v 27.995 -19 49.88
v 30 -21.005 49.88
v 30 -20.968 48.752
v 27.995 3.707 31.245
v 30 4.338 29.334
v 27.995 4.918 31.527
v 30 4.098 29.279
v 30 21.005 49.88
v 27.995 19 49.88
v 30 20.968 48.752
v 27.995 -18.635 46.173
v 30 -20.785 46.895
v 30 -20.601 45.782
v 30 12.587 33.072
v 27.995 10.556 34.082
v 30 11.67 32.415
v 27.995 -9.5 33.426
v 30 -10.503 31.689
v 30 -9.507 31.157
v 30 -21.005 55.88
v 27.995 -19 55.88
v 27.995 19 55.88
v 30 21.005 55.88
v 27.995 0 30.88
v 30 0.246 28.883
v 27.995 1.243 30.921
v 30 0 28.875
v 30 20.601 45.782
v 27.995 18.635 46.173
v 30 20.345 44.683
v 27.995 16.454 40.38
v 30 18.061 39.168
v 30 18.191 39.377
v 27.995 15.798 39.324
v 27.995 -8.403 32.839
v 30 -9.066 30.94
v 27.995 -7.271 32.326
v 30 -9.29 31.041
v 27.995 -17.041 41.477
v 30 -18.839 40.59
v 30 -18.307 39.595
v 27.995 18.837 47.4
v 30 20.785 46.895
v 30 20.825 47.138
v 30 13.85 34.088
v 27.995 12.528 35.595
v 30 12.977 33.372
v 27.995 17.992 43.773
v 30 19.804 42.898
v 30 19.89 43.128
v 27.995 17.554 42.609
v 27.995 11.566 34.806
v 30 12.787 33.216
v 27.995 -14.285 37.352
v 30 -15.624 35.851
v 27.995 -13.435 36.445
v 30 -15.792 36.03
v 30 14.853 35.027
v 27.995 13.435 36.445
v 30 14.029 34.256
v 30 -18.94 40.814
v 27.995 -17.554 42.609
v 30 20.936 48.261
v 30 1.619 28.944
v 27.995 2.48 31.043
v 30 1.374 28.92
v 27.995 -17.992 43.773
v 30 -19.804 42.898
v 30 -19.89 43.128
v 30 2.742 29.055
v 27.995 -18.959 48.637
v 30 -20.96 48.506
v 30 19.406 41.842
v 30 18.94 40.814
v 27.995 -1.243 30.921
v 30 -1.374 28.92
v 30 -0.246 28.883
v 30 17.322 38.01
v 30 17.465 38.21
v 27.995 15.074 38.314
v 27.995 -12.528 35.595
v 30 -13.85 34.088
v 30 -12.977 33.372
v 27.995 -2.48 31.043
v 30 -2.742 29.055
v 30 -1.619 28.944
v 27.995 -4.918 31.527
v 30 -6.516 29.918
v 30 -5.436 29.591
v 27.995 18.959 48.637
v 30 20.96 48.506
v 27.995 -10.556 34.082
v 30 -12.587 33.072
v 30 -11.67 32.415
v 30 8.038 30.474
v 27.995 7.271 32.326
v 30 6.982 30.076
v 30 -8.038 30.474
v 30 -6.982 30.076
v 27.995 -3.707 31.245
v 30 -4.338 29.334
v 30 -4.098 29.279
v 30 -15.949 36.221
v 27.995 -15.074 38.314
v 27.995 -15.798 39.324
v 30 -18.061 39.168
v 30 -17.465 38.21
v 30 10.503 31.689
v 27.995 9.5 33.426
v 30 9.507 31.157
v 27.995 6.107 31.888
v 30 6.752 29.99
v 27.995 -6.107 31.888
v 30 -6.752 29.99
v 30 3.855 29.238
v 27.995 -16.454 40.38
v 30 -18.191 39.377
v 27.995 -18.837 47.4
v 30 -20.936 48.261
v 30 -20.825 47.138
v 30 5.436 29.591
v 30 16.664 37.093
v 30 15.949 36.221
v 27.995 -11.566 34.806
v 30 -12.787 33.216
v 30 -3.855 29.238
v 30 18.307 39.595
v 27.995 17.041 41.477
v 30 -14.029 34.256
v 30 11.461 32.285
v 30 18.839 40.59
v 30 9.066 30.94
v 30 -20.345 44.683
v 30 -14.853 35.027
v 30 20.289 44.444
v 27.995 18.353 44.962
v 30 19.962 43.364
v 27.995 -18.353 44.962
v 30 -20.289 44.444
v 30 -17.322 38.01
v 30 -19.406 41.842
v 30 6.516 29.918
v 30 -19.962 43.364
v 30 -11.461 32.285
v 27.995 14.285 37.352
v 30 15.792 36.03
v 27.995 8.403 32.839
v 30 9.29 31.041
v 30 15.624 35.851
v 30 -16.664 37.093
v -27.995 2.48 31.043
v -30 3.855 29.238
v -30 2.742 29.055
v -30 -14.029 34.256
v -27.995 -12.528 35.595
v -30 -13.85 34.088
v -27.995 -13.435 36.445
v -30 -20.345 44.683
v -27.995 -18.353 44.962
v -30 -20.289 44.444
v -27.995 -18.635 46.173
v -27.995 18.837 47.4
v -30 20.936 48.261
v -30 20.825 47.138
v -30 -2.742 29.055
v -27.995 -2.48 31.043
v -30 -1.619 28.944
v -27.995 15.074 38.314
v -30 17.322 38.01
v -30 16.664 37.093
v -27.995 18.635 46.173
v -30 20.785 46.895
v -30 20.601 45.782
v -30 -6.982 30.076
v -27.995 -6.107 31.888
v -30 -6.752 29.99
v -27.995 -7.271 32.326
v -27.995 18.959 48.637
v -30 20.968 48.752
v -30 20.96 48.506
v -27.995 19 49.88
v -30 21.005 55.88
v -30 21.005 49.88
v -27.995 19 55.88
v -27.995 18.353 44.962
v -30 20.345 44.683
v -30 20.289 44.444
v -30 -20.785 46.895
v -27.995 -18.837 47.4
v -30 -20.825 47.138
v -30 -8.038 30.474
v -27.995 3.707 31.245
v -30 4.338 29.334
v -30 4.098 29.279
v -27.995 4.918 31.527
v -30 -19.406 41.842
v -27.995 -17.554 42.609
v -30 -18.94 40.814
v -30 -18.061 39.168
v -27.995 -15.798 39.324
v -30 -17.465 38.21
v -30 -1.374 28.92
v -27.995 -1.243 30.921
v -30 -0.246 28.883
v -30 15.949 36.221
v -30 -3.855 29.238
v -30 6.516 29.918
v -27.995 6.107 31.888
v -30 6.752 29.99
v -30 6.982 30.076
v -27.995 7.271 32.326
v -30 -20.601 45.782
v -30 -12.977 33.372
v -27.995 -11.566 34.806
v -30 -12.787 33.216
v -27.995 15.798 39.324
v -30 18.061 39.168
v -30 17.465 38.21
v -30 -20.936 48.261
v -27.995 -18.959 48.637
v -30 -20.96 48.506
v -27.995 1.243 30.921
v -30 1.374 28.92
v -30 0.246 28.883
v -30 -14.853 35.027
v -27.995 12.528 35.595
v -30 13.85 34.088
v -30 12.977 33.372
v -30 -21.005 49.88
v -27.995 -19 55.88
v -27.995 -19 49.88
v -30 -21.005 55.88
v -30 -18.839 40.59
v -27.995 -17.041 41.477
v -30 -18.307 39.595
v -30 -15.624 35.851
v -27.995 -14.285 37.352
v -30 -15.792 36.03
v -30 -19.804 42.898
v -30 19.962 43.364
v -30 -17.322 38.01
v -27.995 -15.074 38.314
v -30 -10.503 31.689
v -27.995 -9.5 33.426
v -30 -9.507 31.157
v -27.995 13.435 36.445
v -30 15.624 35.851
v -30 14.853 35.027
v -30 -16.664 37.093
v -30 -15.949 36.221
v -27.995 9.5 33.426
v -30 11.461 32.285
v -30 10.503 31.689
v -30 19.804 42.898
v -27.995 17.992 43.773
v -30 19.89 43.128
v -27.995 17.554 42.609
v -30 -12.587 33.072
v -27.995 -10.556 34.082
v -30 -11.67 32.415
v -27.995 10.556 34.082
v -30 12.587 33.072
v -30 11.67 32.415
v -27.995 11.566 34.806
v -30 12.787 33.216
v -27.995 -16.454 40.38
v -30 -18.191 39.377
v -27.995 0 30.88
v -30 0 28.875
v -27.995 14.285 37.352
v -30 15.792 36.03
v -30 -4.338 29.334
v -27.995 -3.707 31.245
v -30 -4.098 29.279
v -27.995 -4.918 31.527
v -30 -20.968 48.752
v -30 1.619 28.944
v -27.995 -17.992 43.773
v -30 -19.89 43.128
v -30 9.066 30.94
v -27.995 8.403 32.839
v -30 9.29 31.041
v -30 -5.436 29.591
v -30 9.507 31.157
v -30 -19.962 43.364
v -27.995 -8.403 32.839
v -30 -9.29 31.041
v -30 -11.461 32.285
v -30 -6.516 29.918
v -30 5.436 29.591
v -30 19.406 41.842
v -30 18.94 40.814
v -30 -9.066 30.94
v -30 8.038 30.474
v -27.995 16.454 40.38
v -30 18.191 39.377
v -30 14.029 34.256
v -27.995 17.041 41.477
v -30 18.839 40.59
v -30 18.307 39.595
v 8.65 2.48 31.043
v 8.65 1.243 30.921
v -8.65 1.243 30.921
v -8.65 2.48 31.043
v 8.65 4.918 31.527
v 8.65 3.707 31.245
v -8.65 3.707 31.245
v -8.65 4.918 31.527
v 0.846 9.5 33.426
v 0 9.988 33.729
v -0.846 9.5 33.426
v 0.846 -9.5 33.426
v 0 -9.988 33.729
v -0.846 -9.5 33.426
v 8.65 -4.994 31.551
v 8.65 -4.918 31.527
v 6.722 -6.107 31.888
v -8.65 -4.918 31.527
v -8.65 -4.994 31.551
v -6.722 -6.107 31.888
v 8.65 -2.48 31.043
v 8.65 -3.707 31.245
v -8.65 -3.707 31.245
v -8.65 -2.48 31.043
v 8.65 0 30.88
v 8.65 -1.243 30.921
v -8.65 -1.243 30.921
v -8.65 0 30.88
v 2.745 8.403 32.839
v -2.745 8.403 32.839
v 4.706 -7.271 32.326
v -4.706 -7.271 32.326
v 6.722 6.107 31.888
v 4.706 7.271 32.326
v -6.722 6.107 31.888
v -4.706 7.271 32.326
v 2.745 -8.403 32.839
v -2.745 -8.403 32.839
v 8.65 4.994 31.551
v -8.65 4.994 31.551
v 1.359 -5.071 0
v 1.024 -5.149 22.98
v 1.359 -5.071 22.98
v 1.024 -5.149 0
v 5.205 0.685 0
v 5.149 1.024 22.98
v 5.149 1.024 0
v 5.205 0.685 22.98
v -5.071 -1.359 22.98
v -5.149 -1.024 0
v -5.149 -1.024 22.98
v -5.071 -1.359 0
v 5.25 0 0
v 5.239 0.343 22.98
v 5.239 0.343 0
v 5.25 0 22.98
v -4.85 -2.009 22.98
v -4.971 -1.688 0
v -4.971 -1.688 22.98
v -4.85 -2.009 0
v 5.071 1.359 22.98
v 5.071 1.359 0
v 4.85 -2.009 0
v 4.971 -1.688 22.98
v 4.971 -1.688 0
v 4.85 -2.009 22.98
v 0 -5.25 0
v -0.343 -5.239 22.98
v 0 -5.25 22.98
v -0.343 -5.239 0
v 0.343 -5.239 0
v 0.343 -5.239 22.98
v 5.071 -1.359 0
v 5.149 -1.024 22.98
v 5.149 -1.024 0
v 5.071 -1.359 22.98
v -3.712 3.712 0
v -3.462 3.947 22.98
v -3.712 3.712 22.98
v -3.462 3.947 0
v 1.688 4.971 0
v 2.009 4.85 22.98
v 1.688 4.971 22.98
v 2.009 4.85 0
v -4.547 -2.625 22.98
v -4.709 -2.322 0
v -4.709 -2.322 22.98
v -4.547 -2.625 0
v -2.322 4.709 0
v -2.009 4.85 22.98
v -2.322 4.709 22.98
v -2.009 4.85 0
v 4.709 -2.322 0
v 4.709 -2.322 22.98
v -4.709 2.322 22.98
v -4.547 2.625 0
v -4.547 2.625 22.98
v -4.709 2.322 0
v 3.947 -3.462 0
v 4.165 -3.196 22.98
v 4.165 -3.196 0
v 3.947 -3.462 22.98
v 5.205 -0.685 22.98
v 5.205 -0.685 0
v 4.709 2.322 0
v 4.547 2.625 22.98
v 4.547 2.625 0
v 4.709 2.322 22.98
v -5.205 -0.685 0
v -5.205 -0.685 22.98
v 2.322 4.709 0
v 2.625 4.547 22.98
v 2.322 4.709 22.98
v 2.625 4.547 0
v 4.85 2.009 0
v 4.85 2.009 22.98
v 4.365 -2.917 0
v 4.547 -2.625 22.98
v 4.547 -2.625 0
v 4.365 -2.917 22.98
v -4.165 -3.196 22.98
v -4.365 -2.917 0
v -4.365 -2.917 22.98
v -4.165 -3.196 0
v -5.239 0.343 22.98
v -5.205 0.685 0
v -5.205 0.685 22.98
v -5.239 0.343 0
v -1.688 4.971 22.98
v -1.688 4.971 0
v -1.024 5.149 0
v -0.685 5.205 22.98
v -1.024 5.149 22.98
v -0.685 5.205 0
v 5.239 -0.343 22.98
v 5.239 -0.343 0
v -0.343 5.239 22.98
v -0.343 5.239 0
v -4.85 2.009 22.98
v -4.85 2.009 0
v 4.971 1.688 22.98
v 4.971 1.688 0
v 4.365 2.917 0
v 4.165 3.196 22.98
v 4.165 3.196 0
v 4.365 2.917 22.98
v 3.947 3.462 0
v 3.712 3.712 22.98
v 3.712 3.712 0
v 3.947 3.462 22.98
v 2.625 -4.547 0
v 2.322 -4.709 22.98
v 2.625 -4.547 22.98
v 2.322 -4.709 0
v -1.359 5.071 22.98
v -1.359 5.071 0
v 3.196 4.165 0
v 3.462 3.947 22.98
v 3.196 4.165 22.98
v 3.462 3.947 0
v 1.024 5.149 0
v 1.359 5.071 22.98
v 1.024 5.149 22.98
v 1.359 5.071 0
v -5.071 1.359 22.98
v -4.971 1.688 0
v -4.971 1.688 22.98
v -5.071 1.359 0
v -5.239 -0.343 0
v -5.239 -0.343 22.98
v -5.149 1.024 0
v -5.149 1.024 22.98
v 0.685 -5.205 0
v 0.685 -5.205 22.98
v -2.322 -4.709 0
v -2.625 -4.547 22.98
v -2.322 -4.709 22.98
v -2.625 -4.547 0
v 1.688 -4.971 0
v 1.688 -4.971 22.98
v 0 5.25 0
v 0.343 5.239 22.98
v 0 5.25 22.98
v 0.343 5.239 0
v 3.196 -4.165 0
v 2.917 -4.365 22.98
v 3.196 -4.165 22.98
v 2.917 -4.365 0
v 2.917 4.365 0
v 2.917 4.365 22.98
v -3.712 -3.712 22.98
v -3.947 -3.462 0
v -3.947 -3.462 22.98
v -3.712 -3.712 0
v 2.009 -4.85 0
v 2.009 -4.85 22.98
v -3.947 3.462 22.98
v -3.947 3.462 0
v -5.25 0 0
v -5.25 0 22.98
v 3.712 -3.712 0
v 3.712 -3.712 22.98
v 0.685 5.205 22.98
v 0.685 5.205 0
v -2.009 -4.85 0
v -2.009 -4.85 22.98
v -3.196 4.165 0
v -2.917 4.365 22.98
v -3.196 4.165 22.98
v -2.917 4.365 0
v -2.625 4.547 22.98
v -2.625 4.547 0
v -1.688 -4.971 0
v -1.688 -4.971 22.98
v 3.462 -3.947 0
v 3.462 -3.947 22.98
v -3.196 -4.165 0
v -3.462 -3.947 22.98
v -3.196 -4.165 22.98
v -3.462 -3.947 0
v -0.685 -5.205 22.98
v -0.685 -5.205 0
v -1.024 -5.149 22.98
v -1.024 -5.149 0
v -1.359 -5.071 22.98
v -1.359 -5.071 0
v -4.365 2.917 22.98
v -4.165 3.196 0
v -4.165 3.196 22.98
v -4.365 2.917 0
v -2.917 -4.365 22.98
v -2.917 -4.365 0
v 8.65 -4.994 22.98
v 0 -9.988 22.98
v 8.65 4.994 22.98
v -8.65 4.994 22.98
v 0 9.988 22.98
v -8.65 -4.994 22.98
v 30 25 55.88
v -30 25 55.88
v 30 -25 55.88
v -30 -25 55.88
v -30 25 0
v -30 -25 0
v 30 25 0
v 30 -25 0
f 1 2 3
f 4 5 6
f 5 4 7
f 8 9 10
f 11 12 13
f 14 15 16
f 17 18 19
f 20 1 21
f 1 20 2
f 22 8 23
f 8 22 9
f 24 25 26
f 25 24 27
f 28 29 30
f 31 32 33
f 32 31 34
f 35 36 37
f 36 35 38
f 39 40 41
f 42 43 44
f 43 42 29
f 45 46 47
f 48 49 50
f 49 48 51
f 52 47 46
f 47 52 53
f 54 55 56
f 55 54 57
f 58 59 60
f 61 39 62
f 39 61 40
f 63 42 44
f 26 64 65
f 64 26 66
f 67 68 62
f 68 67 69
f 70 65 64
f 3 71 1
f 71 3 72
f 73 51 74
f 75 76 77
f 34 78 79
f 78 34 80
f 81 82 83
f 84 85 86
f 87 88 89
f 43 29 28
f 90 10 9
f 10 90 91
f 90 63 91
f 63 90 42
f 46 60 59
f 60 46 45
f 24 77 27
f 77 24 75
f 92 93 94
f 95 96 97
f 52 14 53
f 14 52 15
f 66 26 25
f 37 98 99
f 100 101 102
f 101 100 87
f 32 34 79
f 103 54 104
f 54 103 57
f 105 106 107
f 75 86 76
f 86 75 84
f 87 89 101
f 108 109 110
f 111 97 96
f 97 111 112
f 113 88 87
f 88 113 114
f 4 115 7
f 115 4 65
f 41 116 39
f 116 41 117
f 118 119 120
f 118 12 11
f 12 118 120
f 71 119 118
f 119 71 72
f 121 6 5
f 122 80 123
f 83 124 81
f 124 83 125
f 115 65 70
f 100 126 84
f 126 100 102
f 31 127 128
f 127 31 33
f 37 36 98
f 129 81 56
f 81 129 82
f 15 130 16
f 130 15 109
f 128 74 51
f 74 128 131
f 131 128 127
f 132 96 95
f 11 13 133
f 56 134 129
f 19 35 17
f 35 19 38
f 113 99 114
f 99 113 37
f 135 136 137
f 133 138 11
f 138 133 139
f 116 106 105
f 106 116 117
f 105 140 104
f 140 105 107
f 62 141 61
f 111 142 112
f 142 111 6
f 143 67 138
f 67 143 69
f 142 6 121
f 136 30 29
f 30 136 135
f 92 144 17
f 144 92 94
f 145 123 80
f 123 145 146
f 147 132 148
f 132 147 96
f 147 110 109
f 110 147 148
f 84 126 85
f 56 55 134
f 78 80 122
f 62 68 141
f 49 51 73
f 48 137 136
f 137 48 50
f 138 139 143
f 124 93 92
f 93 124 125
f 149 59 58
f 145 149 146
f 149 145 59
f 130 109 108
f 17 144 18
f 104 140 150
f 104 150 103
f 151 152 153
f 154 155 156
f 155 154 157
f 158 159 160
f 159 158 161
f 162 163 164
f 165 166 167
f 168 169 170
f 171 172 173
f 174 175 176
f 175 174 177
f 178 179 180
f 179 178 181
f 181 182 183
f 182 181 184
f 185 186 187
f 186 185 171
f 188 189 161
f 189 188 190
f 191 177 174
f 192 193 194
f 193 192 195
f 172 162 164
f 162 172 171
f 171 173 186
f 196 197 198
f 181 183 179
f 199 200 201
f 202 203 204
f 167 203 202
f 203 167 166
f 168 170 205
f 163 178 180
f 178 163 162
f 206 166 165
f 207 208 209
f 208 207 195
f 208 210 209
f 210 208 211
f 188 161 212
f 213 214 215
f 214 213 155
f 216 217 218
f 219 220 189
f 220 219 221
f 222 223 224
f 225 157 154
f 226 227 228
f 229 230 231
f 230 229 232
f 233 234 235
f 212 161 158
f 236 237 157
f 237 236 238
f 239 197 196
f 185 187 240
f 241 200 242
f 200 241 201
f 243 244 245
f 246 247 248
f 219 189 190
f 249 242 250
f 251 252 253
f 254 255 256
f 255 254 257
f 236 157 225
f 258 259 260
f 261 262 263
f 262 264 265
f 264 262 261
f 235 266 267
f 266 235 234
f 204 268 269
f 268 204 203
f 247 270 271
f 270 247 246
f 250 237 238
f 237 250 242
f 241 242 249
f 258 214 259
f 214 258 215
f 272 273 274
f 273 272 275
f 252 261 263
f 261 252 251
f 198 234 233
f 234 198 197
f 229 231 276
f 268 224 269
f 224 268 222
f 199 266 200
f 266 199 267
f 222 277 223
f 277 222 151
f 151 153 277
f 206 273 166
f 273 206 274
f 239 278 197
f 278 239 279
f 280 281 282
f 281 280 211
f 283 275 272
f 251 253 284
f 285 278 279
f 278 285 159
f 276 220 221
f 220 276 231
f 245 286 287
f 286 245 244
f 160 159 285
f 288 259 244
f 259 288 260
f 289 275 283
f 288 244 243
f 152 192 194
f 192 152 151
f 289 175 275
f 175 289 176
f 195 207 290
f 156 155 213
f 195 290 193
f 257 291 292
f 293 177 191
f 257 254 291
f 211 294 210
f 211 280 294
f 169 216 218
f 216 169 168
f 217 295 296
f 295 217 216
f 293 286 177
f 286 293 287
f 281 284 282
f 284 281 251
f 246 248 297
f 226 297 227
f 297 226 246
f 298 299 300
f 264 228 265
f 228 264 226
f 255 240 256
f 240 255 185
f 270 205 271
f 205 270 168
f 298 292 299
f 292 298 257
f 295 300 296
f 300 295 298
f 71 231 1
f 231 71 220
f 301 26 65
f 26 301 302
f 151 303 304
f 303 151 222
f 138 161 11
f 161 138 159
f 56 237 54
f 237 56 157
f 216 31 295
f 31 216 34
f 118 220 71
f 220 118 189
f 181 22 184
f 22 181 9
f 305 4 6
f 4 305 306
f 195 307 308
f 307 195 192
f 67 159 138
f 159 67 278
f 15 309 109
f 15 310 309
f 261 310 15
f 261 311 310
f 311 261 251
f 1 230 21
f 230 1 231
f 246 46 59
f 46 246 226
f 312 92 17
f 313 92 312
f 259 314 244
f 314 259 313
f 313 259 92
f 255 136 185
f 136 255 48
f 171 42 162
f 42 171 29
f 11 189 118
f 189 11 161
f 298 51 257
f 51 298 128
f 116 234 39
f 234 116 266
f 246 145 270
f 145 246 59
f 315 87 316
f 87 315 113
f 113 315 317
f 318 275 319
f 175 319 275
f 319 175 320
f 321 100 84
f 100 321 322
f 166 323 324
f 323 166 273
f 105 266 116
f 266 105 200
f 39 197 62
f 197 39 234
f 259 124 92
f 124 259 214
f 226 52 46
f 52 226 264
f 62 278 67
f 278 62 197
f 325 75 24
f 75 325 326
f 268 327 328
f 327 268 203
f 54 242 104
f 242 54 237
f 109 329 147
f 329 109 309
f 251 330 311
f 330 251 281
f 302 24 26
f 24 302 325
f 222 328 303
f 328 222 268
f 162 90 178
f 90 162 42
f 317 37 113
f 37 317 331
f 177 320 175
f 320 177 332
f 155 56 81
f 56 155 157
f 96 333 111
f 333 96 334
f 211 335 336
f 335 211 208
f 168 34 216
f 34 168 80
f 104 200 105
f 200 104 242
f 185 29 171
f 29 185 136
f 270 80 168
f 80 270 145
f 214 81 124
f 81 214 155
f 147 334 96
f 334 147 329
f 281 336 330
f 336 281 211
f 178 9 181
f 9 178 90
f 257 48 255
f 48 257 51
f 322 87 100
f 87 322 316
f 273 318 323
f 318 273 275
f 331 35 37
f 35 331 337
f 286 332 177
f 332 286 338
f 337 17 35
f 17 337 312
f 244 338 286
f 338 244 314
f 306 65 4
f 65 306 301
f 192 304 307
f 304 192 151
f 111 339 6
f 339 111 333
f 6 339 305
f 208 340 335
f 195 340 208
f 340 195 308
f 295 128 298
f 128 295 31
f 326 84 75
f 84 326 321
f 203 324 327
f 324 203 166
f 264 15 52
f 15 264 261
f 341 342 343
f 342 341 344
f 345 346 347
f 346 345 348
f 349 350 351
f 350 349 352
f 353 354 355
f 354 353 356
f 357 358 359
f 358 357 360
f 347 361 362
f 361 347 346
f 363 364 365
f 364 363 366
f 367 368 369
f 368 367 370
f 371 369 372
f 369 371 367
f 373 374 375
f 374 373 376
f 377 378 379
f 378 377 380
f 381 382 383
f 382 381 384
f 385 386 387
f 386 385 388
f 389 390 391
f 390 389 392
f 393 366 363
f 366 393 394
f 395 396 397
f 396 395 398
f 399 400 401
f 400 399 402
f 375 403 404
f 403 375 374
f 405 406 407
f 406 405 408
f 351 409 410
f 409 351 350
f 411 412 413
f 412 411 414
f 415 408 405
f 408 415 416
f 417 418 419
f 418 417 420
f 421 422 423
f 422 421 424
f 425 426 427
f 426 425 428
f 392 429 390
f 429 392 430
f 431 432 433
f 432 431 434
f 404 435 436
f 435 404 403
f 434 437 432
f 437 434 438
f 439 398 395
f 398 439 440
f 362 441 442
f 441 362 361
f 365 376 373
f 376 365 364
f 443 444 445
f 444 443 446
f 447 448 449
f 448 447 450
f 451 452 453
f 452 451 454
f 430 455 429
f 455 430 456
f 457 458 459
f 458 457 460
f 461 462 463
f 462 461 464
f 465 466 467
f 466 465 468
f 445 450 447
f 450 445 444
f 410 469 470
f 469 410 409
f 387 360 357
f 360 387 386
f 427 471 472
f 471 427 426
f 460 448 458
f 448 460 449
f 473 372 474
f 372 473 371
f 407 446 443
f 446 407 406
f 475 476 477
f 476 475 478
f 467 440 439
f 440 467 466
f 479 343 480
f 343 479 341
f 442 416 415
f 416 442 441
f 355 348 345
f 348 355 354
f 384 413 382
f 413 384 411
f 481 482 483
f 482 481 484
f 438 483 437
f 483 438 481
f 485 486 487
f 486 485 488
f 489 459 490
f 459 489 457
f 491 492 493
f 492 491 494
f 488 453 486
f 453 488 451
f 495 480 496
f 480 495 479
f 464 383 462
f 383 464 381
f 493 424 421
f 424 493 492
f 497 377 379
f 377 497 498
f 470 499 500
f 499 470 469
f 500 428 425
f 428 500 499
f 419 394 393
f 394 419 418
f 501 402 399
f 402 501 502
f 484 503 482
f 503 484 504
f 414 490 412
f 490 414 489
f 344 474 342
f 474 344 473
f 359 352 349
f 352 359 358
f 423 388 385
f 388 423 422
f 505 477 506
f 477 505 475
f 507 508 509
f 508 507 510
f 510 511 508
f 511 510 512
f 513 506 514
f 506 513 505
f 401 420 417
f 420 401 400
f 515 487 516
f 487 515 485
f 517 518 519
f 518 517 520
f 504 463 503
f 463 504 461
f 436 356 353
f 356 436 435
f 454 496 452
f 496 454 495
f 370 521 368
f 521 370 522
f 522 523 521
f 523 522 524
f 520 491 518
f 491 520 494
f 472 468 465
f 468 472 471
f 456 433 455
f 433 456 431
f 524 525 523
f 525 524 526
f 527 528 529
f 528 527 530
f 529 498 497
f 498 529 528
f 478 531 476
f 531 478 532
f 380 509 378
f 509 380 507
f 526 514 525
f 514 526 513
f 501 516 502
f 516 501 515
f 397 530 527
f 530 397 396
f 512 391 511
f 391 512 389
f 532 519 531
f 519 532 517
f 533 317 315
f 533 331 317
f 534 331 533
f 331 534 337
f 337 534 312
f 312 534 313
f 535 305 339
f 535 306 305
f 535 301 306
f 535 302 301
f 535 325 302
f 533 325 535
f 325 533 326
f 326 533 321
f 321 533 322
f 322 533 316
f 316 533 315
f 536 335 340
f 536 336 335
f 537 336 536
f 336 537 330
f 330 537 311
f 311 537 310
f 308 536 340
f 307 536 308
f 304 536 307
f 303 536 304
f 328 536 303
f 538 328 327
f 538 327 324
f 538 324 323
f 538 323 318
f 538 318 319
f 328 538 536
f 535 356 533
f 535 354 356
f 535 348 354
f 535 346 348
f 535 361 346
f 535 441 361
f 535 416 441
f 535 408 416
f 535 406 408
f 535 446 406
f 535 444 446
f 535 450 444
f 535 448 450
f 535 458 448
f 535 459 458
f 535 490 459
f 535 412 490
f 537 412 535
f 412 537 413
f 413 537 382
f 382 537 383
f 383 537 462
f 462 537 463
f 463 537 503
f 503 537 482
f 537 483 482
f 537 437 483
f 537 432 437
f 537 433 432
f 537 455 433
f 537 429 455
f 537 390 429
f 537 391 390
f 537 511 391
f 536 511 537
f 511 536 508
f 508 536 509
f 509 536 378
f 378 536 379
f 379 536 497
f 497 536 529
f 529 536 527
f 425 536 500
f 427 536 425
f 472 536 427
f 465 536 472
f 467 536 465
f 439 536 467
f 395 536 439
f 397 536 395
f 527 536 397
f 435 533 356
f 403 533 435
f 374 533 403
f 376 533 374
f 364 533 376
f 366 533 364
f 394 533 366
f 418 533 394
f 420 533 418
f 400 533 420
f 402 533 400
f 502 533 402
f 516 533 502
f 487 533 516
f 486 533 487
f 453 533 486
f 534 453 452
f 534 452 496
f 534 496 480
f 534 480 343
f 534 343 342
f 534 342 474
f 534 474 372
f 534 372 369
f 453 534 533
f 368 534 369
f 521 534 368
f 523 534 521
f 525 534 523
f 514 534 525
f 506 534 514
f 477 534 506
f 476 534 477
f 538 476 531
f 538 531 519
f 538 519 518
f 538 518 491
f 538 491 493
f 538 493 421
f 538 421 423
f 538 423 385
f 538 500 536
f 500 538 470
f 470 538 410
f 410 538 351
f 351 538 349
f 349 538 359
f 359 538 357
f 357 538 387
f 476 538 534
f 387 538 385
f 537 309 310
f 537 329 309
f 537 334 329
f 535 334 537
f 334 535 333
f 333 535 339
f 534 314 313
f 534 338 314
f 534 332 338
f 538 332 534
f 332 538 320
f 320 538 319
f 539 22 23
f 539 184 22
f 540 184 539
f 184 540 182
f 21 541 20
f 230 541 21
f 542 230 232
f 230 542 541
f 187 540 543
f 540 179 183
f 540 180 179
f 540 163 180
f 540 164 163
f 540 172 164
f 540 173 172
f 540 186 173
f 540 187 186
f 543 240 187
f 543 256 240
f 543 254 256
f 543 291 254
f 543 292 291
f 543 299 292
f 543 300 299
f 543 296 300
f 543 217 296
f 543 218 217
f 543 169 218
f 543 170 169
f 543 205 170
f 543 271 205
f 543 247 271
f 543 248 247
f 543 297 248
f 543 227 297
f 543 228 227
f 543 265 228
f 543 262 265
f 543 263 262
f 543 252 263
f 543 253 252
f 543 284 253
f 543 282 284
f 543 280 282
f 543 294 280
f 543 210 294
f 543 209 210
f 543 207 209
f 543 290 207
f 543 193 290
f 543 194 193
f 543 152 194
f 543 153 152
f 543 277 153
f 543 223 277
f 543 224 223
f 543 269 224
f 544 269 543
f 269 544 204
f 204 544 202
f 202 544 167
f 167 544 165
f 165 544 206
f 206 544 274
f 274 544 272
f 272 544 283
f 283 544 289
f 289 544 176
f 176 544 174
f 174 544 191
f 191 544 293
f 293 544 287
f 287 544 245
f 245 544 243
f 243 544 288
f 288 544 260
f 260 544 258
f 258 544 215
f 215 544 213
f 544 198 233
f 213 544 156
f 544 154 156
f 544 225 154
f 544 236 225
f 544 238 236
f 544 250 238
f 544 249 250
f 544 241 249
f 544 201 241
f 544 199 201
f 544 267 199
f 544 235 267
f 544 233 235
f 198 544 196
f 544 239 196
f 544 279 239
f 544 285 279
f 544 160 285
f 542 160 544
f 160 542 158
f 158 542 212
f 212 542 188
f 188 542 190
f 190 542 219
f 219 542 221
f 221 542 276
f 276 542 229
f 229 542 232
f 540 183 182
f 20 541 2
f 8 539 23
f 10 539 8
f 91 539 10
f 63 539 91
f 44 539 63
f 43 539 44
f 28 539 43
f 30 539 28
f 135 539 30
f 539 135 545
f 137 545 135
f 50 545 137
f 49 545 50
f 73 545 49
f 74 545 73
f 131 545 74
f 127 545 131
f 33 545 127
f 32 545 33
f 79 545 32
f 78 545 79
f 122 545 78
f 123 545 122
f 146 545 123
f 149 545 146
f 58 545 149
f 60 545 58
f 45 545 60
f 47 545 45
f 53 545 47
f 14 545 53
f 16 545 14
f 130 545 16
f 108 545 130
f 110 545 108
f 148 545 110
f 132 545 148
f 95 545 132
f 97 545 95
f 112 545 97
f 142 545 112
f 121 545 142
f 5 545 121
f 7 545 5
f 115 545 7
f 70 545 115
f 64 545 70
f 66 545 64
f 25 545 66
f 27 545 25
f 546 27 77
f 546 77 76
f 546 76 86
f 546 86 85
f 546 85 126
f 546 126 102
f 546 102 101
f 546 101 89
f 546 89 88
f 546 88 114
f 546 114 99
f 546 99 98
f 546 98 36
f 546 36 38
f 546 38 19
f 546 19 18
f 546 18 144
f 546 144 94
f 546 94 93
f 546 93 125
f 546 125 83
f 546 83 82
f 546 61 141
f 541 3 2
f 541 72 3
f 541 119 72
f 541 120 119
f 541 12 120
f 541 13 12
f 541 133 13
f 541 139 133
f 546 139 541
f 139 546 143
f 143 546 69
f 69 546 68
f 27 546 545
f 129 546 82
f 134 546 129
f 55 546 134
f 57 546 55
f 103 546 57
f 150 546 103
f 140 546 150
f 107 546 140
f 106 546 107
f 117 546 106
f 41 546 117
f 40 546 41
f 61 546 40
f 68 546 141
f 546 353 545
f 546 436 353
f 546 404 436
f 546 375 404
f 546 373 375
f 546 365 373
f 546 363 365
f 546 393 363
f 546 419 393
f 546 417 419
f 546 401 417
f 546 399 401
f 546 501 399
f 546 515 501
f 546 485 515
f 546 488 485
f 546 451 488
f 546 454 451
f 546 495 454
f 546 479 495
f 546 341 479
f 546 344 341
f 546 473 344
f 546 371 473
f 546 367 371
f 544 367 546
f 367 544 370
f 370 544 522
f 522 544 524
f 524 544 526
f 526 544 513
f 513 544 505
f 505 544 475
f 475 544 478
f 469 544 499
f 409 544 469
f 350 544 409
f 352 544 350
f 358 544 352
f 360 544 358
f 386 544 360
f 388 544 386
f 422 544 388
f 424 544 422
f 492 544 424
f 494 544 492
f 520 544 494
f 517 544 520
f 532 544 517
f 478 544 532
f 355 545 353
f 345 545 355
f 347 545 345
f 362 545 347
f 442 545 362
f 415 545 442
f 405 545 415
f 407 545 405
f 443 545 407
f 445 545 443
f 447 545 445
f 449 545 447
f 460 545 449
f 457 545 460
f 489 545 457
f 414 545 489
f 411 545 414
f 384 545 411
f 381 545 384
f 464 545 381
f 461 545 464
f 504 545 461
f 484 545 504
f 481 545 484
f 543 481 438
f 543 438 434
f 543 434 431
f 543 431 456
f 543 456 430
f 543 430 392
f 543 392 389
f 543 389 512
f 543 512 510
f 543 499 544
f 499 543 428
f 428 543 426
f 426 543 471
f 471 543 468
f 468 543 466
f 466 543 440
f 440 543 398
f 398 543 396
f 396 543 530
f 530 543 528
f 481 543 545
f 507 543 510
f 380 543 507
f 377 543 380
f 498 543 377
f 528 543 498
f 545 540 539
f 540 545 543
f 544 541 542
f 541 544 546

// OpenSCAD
// freETarget (Competition build) pipe-guide bracket
// A hex pocket traps the M10 bolt head (NUT_TRAP = false) or an M10 nut (NUT_TRAP = true),
// so the fastener is tightened from inside the target box.
// Build all four STLs with ../build-stls.sh.
// Rides the 1" steel pipe uprights so the target can't twist while raising/lowering.
// Source dims: freETarget drawings FRE-007 / FRE-008 (side panels):
//   housing outside width 304 mm, 2x dia 10 mm side holes, 250 mm apart.
//
// Model axes: X = out from the side panel (X=0 is the panel face, printed on the bed)
//             Y = front/back,  Z = vertical, Z=0 at the side-hole centre.
// Set ONE_PIECE = true for a single bracket spanning both holes (needs a >=310 mm bed).

ONE_PIECE   = false;
NUT_TRAP    = false;        // true: trap an M10 nut (bolt head inside the box, use M10x40)
                            // false: trap the hex bolt HEAD (nut inside the box, use M10x55)

IN          = 25.4;
TARGET_W    = 304;          // outside width across side panels
PIPE_GAP_W  = 14.4 * IN;    // design inside-to-inside pipe spacing (measured ~14.5")
PIPE_OD     = 33.4;         // 1" NPS steel pipe = 1.315"
HOLE_PITCH  = 250;          // side-hole spacing

U_CLEAR     = 2.3;          // radial clearance, pipe to U
ARM_T       = 6;            // U arm wall thickness
ARM_PAST    = 6;            // how far the arms extend past the U centre
LEN         = 60;           // height of each bracket head
LEAD        = 2;            // 45-degree lead-in on the U at top and bottom
BOLT_D      = 10.5;         // M10 clearance
HEX_AF      = 17.3;         // hex pocket across flats: traps a 17 mm (DIN 933) or 16 mm (ISO 4017) M10 head
HEAD_H      = NUT_TRAP ? 8 : 6.4;       // M10 nut height / M10 hex head height
HEAD_RECESS = NUT_TRAP ? 4 : 1.5;       // nut/head top sits this far below the U floor
WEB_T       = 10;           // one-piece only: web thickness

FLOOR_X   = (PIPE_GAP_W - TARGET_W) / 2;   // 30.88
U_R       = PIPE_OD/2 + U_CLEAR;           // 19.0
U_CX      = FLOOR_X + U_R;
HALF_W    = U_R + ARM_T;
X_MAX     = U_CX + ARM_PAST;
CB_BOTTOM = FLOOR_X - HEAD_RECESS - HEAD_H;

$fn = 96;

module u_cavity_2d(r) {            // in the XY plane
    translate([U_CX, 0]) circle(r);
    translate([U_CX, -r]) square([X_MAX + 10, 2*r]);
}

module u_cavity() {                // extruded along Z with lead-in flares at both ends
    translate([0,0,-LEN/2 - 1]) linear_extrude(LEN + 2) u_cavity_2d(U_R);
    // 45-degree flare: radius U_R at (LEN/2 - LEAD), U_R + LEAD + 0.5 at (LEN/2 + 0.5)
    for (s = [-1, 1])
        hull() {
            translate([0,0, s*(LEN/2 - LEAD)]) linear_extrude(0.01, center=true) u_cavity_2d(U_R);
            translate([0,0, s*(LEN/2 + 0.5)])  linear_extrude(0.01, center=true) u_cavity_2d(U_R + LEAD + 0.5);
        }
}

module bolt_cut() {
    rotate([0,90,0]) translate([0,0,-1]) cylinder(d=BOLT_D, h=X_MAX + 2);
    // hex pocket (anti-rotation) for the bolt head
    translate([CB_BOTTOM,0,0]) rotate([0,90,0]) rotate([0,0,30])
        cylinder(d=HEX_AF/cos(30), h=X_MAX, $fn=6);
}

module head_body() {
    translate([0, -HALF_W, -LEN/2]) cube([X_MAX, 2*HALF_W, LEN]);
}

module bracket() {
    difference() {
        union() {
            head_body();
            if (ONE_PIECE) {
                translate([0,0,HOLE_PITCH]) head_body();
                translate([0, -HALF_W, 0]) cube([WEB_T, 2*HALF_W, HOLE_PITCH]);
            }
        }
        u_cavity();
        bolt_cut();
        if (ONE_PIECE) translate([0,0,HOLE_PITCH]) { u_cavity(); bolt_cut(); }
    }
}

// Print orientation: panel face (X=0) down on the bed.
rotate([0,-90,0]) bracket();
